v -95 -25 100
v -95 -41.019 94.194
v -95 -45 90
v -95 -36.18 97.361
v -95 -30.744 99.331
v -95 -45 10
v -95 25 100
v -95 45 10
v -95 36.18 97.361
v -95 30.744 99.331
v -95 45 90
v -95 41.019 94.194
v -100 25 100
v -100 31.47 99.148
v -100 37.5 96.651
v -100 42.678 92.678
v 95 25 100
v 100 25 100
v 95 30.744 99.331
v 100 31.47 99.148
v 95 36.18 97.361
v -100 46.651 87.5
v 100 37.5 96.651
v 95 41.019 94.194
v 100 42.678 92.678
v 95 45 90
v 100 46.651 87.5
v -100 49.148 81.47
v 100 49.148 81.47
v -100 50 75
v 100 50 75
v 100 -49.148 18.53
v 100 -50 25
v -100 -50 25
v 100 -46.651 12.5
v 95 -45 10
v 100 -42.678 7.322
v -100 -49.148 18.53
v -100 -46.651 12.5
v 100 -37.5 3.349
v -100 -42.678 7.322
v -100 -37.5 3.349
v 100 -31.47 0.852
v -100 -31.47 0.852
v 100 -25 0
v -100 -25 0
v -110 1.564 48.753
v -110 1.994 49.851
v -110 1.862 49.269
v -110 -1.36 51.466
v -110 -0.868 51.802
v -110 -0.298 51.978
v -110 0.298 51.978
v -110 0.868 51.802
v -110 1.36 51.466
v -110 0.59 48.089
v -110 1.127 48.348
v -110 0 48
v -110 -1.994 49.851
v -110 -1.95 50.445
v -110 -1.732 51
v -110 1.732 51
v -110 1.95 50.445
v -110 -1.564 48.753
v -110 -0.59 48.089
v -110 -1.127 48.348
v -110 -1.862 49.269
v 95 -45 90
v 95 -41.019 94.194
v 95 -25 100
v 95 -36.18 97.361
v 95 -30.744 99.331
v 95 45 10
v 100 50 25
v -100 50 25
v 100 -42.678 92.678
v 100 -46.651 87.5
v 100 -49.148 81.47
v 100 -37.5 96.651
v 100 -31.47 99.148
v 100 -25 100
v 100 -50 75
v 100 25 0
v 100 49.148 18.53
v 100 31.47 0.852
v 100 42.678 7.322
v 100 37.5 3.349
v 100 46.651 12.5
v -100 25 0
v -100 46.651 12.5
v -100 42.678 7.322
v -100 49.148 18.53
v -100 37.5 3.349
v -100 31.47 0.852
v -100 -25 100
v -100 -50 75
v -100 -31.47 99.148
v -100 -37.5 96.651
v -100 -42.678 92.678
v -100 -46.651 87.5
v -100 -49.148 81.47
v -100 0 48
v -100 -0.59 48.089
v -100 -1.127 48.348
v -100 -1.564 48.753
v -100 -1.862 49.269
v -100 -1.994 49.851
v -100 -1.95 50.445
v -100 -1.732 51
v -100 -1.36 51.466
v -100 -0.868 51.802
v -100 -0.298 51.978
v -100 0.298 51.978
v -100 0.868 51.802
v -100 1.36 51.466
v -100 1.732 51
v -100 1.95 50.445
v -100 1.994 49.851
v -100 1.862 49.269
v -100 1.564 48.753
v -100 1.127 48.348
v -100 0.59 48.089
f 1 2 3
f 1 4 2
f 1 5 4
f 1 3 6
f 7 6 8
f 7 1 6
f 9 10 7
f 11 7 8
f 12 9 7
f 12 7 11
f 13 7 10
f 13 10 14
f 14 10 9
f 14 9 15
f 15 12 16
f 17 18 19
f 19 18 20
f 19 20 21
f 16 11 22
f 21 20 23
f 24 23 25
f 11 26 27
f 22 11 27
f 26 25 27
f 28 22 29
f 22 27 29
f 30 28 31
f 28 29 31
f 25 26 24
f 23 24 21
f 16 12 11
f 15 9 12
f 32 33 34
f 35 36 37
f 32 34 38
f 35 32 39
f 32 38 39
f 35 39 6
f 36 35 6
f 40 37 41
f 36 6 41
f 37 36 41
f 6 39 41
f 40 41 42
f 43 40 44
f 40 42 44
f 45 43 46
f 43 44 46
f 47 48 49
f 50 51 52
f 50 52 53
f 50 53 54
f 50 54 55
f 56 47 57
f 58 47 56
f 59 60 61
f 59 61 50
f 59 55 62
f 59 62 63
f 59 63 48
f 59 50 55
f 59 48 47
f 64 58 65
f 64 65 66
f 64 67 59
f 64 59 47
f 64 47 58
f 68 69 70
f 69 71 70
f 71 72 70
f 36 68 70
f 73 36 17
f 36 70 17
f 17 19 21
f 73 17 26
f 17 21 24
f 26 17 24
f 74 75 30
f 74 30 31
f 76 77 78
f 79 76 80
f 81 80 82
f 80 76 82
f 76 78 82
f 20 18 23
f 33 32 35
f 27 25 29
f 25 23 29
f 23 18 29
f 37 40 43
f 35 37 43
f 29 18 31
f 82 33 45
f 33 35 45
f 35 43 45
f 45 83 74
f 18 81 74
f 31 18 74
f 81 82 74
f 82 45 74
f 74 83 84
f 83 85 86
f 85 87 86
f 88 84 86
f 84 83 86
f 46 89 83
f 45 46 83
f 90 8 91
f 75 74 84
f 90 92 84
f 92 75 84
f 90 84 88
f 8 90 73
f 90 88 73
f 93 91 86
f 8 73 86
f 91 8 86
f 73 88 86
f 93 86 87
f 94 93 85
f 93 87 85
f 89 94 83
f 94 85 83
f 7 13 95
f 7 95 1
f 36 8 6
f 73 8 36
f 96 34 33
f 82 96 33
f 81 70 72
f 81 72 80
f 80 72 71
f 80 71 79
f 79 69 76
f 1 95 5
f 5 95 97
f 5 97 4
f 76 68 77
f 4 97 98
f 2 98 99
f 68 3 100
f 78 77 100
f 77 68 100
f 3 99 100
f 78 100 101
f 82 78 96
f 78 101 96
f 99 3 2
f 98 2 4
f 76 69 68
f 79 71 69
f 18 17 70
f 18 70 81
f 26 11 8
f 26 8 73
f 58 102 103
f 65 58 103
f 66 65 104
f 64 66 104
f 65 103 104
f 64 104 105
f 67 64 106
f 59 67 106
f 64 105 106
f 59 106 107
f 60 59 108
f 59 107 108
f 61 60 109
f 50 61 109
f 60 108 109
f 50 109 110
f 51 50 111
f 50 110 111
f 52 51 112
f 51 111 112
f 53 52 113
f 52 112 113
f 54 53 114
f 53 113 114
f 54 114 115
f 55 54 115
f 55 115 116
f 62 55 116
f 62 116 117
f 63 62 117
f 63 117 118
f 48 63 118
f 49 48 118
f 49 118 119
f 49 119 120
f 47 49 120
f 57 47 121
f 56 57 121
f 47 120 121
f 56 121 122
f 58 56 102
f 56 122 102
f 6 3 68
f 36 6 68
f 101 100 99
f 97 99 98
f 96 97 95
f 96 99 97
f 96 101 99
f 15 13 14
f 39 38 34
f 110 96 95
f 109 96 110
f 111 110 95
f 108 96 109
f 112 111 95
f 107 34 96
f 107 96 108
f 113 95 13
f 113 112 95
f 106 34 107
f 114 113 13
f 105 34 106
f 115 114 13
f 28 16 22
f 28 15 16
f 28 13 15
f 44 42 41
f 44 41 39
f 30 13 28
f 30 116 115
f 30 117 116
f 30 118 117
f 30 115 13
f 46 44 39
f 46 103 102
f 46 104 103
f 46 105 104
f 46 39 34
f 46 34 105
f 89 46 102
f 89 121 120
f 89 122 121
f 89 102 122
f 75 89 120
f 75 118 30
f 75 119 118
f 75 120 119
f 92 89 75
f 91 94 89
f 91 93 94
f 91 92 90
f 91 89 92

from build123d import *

# Parameters (mm, degrees)
SKETCH_2_W          = 200
SKETCH_2_H          = 100
EXTRUDE_1_DEPTH     = 100
SKETCH_3_W          = 190
SKETCH_3_H          = 90
CUT_EXTRUDE_1_DEPTH = 90
FILLET_1_R          = 25
SKETCH_4_R          = 2
EXTRUDE_2_DEPTH     = 10


with BuildPart() as part:
    # 草图2 → 凸台-拉伸1 (new body)
    with BuildSketch(Plane.XY):
        Rectangle(SKETCH_2_W, SKETCH_2_H)
    extrude(amount=EXTRUDE_1_DEPTH)

    # 草图3 → 切除-拉伸1 (cut)
    with BuildSketch(Plane.XY.offset(100)):
        Rectangle(SKETCH_3_W, SKETCH_3_H)
    extrude(amount=-CUT_EXTRUDE_1_DEPTH, mode=Mode.SUBTRACT)

    # 圆角1
    # the kernel refuses this fillet: 25 mm, written as the material it takes off along each edge
    with BuildSketch(Plane(origin=(162.5, 50, 0), x_dir=(0, -1, 0), z_dir=(-1, 0, 0)), Plane(origin=(-162.5, -50, 100), x_dir=(0, 0, -1), z_dir=(1, 0, 0))) as fillet_1_piece_1:
        with BuildLine():
            CenterArc((FILLET_1_R, FILLET_1_R), FILLET_1_R, 180, 90)
            Line((0, FILLET_1_R), (0, 0))
            Line((0, 0), (FILLET_1_R, 0))
        make_face()
    extrude(amount=325, mode=Mode.SUBTRACT)
    with BuildSketch(Plane(origin=(-162.5, -50, 0), x_dir=(0, 0, 1), z_dir=(1, 0, 0)), Plane(origin=(162.5, 50, 100), x_dir=(0, -1, 0), z_dir=(-1, 0, 0))) as fillet_1_piece_2:
        with BuildLine():
            CenterArc((FILLET_1_R, -FILLET_1_R), FILLET_1_R, 90, 90)
            Line((0, -FILLET_1_R), (0, 0))
            Line((0, 0), (FILLET_1_R, 0))
        make_face()
    extrude(amount=325, mode=Mode.SUBTRACT)

    # 草图4 → 凸台-拉伸2 (add)
    with BuildSketch(Plane.ZY.offset(100)):
        with Locations(Location((50, 0, 0), (0, 0, 180))):
            Circle(SKETCH_4_R)
    extrude(amount=EXTRUDE_2_DEPTH)


solid = part.part
